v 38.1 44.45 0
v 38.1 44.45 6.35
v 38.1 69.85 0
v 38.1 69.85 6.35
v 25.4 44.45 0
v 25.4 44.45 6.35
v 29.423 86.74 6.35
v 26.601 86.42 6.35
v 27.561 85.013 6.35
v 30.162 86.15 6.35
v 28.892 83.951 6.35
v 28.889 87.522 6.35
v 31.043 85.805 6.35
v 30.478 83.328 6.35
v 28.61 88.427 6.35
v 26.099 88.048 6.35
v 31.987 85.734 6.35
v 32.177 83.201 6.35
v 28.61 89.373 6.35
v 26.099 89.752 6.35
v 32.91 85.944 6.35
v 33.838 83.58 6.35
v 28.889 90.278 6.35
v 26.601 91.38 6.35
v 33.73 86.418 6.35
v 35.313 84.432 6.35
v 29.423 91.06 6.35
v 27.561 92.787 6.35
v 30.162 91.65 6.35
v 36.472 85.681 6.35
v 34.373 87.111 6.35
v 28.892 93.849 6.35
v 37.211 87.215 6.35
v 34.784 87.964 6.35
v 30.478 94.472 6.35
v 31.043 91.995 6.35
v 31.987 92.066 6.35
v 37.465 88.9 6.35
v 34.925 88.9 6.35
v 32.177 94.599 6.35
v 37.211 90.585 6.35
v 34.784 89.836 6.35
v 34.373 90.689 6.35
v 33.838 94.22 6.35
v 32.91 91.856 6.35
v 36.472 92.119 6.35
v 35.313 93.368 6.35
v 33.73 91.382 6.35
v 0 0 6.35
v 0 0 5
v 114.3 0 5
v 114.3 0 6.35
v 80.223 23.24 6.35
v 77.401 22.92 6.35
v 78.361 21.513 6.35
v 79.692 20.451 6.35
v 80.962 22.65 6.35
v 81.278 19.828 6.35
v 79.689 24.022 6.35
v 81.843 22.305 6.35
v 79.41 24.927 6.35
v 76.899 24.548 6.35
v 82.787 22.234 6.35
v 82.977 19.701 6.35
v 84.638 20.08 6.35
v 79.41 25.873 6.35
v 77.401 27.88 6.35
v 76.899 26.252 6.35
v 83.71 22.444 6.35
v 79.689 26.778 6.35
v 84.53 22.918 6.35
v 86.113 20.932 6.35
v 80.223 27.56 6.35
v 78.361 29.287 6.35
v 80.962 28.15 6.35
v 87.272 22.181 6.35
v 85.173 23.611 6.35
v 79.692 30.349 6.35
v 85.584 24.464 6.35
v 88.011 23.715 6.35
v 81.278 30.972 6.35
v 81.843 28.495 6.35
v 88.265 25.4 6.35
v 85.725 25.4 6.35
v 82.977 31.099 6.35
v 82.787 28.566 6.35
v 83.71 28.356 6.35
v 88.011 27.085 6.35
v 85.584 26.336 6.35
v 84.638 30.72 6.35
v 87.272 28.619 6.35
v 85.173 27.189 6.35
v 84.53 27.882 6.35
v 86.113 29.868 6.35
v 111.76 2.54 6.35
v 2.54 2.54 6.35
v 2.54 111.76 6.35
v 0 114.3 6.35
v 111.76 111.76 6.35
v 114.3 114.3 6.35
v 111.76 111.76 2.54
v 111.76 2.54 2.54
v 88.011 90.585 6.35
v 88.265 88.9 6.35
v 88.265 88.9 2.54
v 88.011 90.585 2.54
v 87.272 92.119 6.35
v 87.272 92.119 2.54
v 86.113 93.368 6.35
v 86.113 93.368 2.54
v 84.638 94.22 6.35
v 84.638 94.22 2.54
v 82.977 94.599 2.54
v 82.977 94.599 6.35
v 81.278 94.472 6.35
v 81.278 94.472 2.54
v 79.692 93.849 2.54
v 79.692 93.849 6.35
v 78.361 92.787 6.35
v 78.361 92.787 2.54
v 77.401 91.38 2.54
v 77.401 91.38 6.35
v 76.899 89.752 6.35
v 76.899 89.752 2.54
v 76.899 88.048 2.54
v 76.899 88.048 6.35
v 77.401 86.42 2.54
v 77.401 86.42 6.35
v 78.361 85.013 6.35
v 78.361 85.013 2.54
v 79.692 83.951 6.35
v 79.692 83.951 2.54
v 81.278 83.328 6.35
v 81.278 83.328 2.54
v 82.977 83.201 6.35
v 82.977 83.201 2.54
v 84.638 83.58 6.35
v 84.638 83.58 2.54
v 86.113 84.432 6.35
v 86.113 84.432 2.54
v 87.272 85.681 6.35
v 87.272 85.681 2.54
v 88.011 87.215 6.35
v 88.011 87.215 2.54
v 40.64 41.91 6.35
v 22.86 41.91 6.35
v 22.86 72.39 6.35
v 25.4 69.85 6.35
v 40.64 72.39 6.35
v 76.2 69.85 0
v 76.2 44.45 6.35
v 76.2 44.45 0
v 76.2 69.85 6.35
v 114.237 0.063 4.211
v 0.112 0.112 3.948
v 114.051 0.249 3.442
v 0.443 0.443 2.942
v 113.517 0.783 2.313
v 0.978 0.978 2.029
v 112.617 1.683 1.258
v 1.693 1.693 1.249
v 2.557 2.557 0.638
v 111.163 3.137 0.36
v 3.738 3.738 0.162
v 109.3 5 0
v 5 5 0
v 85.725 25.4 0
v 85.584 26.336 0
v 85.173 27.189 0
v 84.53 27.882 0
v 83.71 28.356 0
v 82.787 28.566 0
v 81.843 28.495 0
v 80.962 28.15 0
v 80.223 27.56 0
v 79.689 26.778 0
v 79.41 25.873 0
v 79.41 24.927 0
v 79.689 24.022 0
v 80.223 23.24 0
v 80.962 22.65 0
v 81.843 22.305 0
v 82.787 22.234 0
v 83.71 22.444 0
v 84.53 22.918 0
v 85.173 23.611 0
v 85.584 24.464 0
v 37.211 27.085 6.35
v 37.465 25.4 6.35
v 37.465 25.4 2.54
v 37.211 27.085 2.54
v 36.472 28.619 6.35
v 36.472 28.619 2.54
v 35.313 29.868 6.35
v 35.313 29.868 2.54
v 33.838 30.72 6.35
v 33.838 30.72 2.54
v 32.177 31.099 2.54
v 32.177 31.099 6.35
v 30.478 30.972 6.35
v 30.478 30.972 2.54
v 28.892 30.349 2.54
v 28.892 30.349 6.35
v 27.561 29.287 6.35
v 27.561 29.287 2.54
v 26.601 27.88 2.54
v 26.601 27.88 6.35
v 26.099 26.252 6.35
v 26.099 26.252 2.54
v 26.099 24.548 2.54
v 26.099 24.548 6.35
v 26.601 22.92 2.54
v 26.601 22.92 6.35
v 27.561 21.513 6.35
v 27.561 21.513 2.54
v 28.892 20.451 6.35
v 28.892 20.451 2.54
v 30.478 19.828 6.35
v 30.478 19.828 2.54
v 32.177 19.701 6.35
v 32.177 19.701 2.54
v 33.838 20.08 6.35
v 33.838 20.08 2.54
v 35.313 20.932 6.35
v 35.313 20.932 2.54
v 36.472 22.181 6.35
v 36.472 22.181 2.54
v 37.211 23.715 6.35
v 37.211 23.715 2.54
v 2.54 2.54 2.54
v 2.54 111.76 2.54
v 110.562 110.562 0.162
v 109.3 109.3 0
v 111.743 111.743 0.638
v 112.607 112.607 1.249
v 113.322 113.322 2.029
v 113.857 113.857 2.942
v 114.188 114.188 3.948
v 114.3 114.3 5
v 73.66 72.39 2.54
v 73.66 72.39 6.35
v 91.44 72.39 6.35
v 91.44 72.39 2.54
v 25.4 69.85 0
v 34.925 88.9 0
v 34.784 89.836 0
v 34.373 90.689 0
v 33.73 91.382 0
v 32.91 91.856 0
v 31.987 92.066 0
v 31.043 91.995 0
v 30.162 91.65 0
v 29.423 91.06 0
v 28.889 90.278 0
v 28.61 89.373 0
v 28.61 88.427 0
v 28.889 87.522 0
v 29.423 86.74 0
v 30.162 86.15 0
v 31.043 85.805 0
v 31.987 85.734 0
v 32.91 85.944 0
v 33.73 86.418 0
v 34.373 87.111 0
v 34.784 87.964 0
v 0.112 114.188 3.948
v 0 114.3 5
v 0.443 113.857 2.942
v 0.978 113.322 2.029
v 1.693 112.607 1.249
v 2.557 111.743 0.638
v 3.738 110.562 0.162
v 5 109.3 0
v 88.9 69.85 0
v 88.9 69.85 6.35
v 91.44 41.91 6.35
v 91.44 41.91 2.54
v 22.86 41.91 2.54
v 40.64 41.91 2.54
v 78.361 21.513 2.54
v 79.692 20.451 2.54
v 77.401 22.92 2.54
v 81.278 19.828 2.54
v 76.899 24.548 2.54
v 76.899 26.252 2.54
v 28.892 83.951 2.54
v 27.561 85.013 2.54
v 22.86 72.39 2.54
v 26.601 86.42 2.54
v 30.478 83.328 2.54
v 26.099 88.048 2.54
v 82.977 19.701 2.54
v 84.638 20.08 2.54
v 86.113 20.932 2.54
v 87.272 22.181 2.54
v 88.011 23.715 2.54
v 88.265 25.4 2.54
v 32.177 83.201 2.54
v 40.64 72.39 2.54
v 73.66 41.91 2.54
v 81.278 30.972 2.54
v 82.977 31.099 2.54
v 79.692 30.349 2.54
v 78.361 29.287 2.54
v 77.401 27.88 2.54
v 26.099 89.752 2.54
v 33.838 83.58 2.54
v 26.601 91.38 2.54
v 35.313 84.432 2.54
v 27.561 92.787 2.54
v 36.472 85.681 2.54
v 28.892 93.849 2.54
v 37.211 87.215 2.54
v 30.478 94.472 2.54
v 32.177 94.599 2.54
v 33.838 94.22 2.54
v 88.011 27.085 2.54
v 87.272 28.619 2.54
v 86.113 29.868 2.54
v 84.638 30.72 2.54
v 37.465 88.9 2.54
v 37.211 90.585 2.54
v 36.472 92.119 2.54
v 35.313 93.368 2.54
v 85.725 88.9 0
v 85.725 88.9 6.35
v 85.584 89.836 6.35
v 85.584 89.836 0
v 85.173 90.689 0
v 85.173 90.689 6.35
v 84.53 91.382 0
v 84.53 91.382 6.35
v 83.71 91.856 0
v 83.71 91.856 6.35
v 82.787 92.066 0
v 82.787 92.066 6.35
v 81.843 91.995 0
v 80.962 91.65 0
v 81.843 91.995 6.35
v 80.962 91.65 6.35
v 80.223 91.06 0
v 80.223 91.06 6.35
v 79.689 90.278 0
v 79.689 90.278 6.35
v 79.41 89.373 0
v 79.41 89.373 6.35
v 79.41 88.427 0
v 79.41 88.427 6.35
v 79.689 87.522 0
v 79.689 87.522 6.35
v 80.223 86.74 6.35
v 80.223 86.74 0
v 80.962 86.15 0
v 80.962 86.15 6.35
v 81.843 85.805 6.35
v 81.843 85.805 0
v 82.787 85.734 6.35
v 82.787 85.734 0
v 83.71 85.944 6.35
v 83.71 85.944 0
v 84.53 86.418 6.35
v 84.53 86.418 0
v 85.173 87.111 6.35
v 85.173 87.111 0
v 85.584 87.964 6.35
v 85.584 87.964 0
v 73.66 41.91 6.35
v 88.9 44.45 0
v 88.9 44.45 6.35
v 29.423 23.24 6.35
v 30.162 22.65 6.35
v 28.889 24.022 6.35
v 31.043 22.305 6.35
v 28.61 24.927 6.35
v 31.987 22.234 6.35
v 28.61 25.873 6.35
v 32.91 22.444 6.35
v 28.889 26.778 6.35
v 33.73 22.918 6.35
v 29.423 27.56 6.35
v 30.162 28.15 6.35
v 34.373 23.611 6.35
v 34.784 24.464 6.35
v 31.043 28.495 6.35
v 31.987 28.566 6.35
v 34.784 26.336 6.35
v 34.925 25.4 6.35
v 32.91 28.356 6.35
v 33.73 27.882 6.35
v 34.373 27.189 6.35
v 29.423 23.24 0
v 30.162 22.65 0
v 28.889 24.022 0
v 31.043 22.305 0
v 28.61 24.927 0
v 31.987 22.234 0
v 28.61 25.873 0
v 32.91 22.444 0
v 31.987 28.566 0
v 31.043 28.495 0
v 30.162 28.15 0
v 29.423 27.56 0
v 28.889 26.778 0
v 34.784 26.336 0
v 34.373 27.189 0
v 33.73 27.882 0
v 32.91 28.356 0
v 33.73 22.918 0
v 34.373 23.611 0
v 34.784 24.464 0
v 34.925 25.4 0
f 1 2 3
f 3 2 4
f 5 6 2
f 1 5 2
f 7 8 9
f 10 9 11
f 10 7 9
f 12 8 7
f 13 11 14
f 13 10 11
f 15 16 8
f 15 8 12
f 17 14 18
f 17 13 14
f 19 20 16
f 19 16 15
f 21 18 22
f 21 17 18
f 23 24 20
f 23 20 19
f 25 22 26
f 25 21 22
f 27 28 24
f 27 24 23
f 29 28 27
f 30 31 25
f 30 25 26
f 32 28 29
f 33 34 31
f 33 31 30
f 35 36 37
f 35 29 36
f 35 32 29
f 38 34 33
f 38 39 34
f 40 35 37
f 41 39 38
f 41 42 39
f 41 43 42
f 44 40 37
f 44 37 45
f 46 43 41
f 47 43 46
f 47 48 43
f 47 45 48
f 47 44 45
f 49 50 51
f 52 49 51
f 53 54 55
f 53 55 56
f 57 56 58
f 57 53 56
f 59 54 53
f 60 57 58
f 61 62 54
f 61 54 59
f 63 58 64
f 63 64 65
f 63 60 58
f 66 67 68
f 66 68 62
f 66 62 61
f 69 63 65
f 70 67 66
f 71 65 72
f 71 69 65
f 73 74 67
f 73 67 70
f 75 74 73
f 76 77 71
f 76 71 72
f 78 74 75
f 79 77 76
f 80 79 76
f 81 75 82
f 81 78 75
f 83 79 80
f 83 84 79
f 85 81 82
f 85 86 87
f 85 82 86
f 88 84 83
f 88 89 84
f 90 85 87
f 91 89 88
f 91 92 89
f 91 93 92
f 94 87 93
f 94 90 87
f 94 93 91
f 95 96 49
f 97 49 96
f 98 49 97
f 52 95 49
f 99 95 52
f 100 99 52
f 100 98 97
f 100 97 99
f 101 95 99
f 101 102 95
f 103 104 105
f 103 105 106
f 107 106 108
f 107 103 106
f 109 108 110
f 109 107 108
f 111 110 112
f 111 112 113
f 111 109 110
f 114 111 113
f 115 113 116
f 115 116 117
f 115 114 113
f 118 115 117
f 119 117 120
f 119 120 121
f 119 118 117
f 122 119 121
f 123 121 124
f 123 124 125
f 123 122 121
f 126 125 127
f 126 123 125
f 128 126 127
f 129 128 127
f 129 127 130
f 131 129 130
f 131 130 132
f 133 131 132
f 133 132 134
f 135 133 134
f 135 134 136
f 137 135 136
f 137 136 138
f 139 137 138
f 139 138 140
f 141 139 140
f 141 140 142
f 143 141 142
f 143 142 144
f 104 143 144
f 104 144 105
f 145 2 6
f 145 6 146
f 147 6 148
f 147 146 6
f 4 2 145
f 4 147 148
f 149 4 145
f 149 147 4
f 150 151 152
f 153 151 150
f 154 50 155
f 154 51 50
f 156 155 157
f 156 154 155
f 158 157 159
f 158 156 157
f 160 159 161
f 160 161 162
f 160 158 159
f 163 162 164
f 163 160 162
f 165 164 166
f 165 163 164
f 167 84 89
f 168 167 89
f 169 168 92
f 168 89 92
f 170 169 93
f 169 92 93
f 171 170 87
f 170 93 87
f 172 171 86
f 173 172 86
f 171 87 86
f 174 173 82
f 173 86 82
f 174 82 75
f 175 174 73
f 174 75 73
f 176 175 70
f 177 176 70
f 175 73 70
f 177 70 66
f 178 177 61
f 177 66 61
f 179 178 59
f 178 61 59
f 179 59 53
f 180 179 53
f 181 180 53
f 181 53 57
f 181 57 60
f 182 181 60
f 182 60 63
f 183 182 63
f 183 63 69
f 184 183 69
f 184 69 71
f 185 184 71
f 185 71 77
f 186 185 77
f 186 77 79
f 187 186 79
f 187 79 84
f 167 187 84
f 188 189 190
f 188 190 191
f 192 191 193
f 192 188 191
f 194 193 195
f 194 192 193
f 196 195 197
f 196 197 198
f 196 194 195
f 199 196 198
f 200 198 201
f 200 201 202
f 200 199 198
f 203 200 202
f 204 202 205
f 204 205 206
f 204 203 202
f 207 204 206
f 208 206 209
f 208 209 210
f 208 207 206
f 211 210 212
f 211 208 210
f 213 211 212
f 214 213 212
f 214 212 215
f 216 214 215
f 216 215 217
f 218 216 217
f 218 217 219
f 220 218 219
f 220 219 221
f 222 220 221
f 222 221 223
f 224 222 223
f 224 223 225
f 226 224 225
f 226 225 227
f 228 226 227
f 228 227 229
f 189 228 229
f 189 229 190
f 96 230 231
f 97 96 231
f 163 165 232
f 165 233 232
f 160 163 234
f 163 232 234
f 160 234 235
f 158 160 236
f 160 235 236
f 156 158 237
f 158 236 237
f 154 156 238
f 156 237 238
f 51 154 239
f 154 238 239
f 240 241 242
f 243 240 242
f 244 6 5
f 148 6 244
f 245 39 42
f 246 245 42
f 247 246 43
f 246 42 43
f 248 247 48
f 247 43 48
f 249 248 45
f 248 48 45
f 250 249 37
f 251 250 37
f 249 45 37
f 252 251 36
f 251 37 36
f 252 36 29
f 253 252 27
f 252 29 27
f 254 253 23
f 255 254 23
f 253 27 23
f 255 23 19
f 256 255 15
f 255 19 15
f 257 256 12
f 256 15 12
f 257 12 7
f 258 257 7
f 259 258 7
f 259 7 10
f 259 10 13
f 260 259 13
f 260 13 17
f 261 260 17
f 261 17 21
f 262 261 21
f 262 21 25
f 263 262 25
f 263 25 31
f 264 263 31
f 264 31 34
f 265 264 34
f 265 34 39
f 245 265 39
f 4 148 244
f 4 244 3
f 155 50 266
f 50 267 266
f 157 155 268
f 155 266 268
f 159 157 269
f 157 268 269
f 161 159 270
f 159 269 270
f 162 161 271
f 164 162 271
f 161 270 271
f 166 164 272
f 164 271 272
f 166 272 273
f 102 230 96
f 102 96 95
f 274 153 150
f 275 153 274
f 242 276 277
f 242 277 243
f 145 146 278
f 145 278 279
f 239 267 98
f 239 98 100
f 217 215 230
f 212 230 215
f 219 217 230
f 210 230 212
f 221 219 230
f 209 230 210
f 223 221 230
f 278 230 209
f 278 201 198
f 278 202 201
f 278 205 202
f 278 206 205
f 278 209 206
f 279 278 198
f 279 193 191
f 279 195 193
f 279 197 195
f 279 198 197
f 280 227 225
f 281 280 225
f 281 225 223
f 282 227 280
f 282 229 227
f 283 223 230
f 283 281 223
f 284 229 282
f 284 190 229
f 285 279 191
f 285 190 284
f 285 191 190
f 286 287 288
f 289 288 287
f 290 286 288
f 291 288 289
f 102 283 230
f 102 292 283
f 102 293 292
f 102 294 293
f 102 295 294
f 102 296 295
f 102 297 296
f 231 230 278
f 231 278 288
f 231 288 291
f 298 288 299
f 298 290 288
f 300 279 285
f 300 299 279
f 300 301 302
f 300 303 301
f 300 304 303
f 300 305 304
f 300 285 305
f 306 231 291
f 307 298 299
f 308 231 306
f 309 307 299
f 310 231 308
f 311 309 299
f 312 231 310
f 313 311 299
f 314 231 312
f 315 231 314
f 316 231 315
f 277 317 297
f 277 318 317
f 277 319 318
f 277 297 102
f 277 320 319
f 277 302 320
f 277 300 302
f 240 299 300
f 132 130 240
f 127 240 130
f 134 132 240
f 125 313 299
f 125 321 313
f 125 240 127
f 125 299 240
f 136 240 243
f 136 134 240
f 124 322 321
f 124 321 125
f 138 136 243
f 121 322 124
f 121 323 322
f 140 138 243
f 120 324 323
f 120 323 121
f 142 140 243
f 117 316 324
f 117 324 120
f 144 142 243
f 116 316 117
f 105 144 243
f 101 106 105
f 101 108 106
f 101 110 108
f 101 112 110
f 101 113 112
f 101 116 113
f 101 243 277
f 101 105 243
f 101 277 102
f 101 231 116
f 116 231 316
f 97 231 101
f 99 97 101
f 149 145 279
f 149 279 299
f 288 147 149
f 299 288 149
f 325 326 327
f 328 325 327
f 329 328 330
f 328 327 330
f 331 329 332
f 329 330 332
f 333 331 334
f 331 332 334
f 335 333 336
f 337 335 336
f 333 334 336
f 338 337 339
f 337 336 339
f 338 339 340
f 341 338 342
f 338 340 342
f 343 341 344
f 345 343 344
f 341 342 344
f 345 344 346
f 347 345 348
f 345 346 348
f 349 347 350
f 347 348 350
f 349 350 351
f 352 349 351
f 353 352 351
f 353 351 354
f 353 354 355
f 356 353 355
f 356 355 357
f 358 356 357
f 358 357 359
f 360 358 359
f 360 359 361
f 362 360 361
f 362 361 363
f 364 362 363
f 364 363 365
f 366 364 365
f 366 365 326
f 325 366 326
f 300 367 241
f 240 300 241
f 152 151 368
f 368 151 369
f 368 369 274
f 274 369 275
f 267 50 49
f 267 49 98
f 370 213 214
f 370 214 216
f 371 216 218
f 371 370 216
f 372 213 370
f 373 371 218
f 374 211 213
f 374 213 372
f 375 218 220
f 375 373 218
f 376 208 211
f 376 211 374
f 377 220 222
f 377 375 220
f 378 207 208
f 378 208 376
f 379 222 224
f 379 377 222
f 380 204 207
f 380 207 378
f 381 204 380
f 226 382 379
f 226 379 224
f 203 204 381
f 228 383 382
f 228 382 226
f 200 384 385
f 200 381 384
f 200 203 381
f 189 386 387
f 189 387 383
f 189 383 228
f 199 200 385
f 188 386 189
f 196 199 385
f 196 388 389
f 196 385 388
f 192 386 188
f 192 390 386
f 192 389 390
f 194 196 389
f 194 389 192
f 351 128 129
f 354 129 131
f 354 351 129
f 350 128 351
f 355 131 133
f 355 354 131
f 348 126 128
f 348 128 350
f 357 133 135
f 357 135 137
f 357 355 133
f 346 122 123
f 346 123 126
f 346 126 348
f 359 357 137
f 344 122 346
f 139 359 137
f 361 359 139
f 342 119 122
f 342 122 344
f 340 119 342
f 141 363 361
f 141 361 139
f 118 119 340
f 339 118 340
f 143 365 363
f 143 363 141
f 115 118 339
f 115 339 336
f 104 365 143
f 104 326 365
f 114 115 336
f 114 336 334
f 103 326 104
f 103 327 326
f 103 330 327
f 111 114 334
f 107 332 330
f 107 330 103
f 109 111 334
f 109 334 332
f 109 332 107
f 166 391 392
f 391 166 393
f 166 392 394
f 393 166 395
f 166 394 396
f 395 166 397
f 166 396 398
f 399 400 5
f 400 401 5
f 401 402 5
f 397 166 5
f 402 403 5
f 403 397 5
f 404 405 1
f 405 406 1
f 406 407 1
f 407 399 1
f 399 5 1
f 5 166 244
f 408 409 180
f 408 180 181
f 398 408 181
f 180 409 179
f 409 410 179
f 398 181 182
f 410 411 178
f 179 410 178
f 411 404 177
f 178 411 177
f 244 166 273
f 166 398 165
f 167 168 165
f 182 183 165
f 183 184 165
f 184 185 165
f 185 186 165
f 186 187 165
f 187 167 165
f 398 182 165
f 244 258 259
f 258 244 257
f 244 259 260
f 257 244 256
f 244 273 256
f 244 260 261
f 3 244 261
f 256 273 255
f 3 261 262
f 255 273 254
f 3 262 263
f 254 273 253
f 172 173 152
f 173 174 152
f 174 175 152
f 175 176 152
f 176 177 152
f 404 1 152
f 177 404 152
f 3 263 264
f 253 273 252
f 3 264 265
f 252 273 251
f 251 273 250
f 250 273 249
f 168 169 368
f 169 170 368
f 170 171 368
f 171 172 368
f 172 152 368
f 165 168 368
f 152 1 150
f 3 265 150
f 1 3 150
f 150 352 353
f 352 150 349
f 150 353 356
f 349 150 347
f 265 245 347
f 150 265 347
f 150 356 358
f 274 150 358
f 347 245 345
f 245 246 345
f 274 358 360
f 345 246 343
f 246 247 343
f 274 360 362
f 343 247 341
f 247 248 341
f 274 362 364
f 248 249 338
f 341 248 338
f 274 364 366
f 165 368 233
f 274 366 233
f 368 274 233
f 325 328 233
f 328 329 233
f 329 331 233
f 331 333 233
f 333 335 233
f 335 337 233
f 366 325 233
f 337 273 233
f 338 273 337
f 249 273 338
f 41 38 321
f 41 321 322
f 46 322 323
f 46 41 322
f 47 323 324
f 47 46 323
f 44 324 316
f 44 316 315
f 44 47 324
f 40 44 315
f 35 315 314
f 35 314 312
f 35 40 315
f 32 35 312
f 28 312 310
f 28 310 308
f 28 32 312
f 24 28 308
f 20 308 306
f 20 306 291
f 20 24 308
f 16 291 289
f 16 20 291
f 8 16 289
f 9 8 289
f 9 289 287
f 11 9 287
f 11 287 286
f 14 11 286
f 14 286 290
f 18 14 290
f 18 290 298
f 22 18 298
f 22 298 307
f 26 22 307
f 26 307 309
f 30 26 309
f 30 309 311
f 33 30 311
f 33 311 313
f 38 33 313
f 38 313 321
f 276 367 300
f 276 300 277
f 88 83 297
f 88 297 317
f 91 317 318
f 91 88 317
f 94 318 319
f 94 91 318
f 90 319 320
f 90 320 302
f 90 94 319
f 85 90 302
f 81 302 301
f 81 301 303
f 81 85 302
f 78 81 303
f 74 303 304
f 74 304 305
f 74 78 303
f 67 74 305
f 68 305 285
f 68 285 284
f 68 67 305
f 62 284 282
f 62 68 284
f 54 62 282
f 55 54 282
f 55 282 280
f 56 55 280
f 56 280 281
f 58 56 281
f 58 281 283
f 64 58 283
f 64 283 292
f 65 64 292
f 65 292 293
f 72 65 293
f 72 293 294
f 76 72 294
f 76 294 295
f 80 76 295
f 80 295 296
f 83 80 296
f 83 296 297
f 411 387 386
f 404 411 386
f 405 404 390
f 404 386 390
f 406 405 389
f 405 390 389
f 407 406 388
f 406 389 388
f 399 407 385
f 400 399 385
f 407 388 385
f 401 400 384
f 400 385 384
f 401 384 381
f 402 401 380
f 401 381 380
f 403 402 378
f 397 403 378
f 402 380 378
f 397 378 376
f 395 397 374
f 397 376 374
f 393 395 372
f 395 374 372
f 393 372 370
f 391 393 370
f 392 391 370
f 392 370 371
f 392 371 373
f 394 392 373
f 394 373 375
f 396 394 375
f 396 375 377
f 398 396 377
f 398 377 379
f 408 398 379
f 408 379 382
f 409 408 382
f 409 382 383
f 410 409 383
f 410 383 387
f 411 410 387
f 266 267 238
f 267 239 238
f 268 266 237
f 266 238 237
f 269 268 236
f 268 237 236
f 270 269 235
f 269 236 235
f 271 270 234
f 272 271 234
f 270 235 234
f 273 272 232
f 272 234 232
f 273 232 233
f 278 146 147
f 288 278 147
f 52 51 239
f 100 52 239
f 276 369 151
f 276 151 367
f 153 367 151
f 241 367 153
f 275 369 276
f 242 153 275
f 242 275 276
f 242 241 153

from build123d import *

# Parameters (mm, degrees)
SKETCH2_W           = 114.3
SKETCH2_H           = 114.3
BOSS_EXTRUDE1_DEPTH = 6.35
SKETCH3_R           = 3.175
CUT_EXTRUDE1_DEPTH  = 162.769287876
SKETCH3_3_R         = 3.175
CUT_EXTRUDE2_DEPTH  = 162.769287876
SKETCH3_4_R         = 3.175
CUT_EXTRUDE3_DEPTH  = 162.769287876
SKETCH3_5_W         = 12.7
SKETCH3_5_H         = 25.4
CUT_EXTRUDE4_DEPTH  = 162.769287876
SKETCH3_6_W         = 12.7
SKETCH3_6_H         = 25.4
CUT_EXTRUDE5_DEPTH  = 162.769287876
SKETCH3_7_R         = 3.175
CUT_EXTRUDE6_DEPTH  = 162.769287876
SHELL1_T            = -2.54
FILLET1_R           = 5


with BuildPart() as part:
    # Sketch2 → Boss-Extrude1 (new body)
    with BuildSketch(Plane.XY):
        with Locations((57.15, 57.15)):
            Rectangle(SKETCH2_W, SKETCH2_H)
    extrude(amount=BOSS_EXTRUDE1_DEPTH)

    # Sketch3 → Cut-Extrude1 (cut, through all)
    with BuildSketch(Plane.XY.offset(6.35)):
        with Locations((31.75, 88.9)):
            Circle(SKETCH3_R)
    extrude(amount=-CUT_EXTRUDE1_DEPTH, mode=Mode.SUBTRACT)

    # Sketch3<3> → Cut-Extrude2 (cut, through all)
    with BuildSketch(Plane.XY.offset(6.35)):
        with Locations((82.55, 88.9)):
            Circle(SKETCH3_3_R)
    extrude(amount=-CUT_EXTRUDE2_DEPTH, mode=Mode.SUBTRACT)

    # Sketch3<4> → Cut-Extrude3 (cut, through all)
    with BuildSketch(Plane.XY.offset(6.35)):
        with Locations((31.75, 25.4)):
            Circle(SKETCH3_4_R)
    extrude(amount=-CUT_EXTRUDE3_DEPTH, mode=Mode.SUBTRACT)

    # Sketch3<5> → Cut-Extrude4 (cut, through all)
    with BuildSketch(Plane.XY.offset(6.35)):
        with Locations((31.75, 57.15)):
            Rectangle(SKETCH3_5_W, SKETCH3_5_H)
    extrude(amount=-CUT_EXTRUDE4_DEPTH, mode=Mode.SUBTRACT)

    # Sketch3<6> → Cut-Extrude5 (cut, through all)
    with BuildSketch(Plane.XY.offset(6.35)):
        with Locations((82.55, 57.15)):
            Rectangle(SKETCH3_6_W, SKETCH3_6_H)
    extrude(amount=-CUT_EXTRUDE5_DEPTH, mode=Mode.SUBTRACT)

    # Sketch3<7> → Cut-Extrude6 (cut, through all)
    with BuildSketch(Plane.XY.offset(6.35)):
        with Locations((82.55, 25.4)):
            Circle(SKETCH3_7_R)
    extrude(amount=-CUT_EXTRUDE6_DEPTH, mode=Mode.SUBTRACT)

    # Shell1
    shell1_openings = [part.faces().sort_by_distance(p)[0] for p in [
        (57.15, 57.15, 6.35),
    ]]
    offset(amount=SHELL1_T, openings=shell1_openings, kind=Kind.INTERSECTION)

    # Fillet1
    fillet1_edges = [part.edges().sort_by_distance(p)[0] for p in [
        (0, 57.15, 0),
        (57.15, 0, 0),
        (114.3, 57.15, 0),
        (57.15, 114.3, 0),
    ]]
    fillet(fillet1_edges, radius=FILLET1_R)


solid = part.part
